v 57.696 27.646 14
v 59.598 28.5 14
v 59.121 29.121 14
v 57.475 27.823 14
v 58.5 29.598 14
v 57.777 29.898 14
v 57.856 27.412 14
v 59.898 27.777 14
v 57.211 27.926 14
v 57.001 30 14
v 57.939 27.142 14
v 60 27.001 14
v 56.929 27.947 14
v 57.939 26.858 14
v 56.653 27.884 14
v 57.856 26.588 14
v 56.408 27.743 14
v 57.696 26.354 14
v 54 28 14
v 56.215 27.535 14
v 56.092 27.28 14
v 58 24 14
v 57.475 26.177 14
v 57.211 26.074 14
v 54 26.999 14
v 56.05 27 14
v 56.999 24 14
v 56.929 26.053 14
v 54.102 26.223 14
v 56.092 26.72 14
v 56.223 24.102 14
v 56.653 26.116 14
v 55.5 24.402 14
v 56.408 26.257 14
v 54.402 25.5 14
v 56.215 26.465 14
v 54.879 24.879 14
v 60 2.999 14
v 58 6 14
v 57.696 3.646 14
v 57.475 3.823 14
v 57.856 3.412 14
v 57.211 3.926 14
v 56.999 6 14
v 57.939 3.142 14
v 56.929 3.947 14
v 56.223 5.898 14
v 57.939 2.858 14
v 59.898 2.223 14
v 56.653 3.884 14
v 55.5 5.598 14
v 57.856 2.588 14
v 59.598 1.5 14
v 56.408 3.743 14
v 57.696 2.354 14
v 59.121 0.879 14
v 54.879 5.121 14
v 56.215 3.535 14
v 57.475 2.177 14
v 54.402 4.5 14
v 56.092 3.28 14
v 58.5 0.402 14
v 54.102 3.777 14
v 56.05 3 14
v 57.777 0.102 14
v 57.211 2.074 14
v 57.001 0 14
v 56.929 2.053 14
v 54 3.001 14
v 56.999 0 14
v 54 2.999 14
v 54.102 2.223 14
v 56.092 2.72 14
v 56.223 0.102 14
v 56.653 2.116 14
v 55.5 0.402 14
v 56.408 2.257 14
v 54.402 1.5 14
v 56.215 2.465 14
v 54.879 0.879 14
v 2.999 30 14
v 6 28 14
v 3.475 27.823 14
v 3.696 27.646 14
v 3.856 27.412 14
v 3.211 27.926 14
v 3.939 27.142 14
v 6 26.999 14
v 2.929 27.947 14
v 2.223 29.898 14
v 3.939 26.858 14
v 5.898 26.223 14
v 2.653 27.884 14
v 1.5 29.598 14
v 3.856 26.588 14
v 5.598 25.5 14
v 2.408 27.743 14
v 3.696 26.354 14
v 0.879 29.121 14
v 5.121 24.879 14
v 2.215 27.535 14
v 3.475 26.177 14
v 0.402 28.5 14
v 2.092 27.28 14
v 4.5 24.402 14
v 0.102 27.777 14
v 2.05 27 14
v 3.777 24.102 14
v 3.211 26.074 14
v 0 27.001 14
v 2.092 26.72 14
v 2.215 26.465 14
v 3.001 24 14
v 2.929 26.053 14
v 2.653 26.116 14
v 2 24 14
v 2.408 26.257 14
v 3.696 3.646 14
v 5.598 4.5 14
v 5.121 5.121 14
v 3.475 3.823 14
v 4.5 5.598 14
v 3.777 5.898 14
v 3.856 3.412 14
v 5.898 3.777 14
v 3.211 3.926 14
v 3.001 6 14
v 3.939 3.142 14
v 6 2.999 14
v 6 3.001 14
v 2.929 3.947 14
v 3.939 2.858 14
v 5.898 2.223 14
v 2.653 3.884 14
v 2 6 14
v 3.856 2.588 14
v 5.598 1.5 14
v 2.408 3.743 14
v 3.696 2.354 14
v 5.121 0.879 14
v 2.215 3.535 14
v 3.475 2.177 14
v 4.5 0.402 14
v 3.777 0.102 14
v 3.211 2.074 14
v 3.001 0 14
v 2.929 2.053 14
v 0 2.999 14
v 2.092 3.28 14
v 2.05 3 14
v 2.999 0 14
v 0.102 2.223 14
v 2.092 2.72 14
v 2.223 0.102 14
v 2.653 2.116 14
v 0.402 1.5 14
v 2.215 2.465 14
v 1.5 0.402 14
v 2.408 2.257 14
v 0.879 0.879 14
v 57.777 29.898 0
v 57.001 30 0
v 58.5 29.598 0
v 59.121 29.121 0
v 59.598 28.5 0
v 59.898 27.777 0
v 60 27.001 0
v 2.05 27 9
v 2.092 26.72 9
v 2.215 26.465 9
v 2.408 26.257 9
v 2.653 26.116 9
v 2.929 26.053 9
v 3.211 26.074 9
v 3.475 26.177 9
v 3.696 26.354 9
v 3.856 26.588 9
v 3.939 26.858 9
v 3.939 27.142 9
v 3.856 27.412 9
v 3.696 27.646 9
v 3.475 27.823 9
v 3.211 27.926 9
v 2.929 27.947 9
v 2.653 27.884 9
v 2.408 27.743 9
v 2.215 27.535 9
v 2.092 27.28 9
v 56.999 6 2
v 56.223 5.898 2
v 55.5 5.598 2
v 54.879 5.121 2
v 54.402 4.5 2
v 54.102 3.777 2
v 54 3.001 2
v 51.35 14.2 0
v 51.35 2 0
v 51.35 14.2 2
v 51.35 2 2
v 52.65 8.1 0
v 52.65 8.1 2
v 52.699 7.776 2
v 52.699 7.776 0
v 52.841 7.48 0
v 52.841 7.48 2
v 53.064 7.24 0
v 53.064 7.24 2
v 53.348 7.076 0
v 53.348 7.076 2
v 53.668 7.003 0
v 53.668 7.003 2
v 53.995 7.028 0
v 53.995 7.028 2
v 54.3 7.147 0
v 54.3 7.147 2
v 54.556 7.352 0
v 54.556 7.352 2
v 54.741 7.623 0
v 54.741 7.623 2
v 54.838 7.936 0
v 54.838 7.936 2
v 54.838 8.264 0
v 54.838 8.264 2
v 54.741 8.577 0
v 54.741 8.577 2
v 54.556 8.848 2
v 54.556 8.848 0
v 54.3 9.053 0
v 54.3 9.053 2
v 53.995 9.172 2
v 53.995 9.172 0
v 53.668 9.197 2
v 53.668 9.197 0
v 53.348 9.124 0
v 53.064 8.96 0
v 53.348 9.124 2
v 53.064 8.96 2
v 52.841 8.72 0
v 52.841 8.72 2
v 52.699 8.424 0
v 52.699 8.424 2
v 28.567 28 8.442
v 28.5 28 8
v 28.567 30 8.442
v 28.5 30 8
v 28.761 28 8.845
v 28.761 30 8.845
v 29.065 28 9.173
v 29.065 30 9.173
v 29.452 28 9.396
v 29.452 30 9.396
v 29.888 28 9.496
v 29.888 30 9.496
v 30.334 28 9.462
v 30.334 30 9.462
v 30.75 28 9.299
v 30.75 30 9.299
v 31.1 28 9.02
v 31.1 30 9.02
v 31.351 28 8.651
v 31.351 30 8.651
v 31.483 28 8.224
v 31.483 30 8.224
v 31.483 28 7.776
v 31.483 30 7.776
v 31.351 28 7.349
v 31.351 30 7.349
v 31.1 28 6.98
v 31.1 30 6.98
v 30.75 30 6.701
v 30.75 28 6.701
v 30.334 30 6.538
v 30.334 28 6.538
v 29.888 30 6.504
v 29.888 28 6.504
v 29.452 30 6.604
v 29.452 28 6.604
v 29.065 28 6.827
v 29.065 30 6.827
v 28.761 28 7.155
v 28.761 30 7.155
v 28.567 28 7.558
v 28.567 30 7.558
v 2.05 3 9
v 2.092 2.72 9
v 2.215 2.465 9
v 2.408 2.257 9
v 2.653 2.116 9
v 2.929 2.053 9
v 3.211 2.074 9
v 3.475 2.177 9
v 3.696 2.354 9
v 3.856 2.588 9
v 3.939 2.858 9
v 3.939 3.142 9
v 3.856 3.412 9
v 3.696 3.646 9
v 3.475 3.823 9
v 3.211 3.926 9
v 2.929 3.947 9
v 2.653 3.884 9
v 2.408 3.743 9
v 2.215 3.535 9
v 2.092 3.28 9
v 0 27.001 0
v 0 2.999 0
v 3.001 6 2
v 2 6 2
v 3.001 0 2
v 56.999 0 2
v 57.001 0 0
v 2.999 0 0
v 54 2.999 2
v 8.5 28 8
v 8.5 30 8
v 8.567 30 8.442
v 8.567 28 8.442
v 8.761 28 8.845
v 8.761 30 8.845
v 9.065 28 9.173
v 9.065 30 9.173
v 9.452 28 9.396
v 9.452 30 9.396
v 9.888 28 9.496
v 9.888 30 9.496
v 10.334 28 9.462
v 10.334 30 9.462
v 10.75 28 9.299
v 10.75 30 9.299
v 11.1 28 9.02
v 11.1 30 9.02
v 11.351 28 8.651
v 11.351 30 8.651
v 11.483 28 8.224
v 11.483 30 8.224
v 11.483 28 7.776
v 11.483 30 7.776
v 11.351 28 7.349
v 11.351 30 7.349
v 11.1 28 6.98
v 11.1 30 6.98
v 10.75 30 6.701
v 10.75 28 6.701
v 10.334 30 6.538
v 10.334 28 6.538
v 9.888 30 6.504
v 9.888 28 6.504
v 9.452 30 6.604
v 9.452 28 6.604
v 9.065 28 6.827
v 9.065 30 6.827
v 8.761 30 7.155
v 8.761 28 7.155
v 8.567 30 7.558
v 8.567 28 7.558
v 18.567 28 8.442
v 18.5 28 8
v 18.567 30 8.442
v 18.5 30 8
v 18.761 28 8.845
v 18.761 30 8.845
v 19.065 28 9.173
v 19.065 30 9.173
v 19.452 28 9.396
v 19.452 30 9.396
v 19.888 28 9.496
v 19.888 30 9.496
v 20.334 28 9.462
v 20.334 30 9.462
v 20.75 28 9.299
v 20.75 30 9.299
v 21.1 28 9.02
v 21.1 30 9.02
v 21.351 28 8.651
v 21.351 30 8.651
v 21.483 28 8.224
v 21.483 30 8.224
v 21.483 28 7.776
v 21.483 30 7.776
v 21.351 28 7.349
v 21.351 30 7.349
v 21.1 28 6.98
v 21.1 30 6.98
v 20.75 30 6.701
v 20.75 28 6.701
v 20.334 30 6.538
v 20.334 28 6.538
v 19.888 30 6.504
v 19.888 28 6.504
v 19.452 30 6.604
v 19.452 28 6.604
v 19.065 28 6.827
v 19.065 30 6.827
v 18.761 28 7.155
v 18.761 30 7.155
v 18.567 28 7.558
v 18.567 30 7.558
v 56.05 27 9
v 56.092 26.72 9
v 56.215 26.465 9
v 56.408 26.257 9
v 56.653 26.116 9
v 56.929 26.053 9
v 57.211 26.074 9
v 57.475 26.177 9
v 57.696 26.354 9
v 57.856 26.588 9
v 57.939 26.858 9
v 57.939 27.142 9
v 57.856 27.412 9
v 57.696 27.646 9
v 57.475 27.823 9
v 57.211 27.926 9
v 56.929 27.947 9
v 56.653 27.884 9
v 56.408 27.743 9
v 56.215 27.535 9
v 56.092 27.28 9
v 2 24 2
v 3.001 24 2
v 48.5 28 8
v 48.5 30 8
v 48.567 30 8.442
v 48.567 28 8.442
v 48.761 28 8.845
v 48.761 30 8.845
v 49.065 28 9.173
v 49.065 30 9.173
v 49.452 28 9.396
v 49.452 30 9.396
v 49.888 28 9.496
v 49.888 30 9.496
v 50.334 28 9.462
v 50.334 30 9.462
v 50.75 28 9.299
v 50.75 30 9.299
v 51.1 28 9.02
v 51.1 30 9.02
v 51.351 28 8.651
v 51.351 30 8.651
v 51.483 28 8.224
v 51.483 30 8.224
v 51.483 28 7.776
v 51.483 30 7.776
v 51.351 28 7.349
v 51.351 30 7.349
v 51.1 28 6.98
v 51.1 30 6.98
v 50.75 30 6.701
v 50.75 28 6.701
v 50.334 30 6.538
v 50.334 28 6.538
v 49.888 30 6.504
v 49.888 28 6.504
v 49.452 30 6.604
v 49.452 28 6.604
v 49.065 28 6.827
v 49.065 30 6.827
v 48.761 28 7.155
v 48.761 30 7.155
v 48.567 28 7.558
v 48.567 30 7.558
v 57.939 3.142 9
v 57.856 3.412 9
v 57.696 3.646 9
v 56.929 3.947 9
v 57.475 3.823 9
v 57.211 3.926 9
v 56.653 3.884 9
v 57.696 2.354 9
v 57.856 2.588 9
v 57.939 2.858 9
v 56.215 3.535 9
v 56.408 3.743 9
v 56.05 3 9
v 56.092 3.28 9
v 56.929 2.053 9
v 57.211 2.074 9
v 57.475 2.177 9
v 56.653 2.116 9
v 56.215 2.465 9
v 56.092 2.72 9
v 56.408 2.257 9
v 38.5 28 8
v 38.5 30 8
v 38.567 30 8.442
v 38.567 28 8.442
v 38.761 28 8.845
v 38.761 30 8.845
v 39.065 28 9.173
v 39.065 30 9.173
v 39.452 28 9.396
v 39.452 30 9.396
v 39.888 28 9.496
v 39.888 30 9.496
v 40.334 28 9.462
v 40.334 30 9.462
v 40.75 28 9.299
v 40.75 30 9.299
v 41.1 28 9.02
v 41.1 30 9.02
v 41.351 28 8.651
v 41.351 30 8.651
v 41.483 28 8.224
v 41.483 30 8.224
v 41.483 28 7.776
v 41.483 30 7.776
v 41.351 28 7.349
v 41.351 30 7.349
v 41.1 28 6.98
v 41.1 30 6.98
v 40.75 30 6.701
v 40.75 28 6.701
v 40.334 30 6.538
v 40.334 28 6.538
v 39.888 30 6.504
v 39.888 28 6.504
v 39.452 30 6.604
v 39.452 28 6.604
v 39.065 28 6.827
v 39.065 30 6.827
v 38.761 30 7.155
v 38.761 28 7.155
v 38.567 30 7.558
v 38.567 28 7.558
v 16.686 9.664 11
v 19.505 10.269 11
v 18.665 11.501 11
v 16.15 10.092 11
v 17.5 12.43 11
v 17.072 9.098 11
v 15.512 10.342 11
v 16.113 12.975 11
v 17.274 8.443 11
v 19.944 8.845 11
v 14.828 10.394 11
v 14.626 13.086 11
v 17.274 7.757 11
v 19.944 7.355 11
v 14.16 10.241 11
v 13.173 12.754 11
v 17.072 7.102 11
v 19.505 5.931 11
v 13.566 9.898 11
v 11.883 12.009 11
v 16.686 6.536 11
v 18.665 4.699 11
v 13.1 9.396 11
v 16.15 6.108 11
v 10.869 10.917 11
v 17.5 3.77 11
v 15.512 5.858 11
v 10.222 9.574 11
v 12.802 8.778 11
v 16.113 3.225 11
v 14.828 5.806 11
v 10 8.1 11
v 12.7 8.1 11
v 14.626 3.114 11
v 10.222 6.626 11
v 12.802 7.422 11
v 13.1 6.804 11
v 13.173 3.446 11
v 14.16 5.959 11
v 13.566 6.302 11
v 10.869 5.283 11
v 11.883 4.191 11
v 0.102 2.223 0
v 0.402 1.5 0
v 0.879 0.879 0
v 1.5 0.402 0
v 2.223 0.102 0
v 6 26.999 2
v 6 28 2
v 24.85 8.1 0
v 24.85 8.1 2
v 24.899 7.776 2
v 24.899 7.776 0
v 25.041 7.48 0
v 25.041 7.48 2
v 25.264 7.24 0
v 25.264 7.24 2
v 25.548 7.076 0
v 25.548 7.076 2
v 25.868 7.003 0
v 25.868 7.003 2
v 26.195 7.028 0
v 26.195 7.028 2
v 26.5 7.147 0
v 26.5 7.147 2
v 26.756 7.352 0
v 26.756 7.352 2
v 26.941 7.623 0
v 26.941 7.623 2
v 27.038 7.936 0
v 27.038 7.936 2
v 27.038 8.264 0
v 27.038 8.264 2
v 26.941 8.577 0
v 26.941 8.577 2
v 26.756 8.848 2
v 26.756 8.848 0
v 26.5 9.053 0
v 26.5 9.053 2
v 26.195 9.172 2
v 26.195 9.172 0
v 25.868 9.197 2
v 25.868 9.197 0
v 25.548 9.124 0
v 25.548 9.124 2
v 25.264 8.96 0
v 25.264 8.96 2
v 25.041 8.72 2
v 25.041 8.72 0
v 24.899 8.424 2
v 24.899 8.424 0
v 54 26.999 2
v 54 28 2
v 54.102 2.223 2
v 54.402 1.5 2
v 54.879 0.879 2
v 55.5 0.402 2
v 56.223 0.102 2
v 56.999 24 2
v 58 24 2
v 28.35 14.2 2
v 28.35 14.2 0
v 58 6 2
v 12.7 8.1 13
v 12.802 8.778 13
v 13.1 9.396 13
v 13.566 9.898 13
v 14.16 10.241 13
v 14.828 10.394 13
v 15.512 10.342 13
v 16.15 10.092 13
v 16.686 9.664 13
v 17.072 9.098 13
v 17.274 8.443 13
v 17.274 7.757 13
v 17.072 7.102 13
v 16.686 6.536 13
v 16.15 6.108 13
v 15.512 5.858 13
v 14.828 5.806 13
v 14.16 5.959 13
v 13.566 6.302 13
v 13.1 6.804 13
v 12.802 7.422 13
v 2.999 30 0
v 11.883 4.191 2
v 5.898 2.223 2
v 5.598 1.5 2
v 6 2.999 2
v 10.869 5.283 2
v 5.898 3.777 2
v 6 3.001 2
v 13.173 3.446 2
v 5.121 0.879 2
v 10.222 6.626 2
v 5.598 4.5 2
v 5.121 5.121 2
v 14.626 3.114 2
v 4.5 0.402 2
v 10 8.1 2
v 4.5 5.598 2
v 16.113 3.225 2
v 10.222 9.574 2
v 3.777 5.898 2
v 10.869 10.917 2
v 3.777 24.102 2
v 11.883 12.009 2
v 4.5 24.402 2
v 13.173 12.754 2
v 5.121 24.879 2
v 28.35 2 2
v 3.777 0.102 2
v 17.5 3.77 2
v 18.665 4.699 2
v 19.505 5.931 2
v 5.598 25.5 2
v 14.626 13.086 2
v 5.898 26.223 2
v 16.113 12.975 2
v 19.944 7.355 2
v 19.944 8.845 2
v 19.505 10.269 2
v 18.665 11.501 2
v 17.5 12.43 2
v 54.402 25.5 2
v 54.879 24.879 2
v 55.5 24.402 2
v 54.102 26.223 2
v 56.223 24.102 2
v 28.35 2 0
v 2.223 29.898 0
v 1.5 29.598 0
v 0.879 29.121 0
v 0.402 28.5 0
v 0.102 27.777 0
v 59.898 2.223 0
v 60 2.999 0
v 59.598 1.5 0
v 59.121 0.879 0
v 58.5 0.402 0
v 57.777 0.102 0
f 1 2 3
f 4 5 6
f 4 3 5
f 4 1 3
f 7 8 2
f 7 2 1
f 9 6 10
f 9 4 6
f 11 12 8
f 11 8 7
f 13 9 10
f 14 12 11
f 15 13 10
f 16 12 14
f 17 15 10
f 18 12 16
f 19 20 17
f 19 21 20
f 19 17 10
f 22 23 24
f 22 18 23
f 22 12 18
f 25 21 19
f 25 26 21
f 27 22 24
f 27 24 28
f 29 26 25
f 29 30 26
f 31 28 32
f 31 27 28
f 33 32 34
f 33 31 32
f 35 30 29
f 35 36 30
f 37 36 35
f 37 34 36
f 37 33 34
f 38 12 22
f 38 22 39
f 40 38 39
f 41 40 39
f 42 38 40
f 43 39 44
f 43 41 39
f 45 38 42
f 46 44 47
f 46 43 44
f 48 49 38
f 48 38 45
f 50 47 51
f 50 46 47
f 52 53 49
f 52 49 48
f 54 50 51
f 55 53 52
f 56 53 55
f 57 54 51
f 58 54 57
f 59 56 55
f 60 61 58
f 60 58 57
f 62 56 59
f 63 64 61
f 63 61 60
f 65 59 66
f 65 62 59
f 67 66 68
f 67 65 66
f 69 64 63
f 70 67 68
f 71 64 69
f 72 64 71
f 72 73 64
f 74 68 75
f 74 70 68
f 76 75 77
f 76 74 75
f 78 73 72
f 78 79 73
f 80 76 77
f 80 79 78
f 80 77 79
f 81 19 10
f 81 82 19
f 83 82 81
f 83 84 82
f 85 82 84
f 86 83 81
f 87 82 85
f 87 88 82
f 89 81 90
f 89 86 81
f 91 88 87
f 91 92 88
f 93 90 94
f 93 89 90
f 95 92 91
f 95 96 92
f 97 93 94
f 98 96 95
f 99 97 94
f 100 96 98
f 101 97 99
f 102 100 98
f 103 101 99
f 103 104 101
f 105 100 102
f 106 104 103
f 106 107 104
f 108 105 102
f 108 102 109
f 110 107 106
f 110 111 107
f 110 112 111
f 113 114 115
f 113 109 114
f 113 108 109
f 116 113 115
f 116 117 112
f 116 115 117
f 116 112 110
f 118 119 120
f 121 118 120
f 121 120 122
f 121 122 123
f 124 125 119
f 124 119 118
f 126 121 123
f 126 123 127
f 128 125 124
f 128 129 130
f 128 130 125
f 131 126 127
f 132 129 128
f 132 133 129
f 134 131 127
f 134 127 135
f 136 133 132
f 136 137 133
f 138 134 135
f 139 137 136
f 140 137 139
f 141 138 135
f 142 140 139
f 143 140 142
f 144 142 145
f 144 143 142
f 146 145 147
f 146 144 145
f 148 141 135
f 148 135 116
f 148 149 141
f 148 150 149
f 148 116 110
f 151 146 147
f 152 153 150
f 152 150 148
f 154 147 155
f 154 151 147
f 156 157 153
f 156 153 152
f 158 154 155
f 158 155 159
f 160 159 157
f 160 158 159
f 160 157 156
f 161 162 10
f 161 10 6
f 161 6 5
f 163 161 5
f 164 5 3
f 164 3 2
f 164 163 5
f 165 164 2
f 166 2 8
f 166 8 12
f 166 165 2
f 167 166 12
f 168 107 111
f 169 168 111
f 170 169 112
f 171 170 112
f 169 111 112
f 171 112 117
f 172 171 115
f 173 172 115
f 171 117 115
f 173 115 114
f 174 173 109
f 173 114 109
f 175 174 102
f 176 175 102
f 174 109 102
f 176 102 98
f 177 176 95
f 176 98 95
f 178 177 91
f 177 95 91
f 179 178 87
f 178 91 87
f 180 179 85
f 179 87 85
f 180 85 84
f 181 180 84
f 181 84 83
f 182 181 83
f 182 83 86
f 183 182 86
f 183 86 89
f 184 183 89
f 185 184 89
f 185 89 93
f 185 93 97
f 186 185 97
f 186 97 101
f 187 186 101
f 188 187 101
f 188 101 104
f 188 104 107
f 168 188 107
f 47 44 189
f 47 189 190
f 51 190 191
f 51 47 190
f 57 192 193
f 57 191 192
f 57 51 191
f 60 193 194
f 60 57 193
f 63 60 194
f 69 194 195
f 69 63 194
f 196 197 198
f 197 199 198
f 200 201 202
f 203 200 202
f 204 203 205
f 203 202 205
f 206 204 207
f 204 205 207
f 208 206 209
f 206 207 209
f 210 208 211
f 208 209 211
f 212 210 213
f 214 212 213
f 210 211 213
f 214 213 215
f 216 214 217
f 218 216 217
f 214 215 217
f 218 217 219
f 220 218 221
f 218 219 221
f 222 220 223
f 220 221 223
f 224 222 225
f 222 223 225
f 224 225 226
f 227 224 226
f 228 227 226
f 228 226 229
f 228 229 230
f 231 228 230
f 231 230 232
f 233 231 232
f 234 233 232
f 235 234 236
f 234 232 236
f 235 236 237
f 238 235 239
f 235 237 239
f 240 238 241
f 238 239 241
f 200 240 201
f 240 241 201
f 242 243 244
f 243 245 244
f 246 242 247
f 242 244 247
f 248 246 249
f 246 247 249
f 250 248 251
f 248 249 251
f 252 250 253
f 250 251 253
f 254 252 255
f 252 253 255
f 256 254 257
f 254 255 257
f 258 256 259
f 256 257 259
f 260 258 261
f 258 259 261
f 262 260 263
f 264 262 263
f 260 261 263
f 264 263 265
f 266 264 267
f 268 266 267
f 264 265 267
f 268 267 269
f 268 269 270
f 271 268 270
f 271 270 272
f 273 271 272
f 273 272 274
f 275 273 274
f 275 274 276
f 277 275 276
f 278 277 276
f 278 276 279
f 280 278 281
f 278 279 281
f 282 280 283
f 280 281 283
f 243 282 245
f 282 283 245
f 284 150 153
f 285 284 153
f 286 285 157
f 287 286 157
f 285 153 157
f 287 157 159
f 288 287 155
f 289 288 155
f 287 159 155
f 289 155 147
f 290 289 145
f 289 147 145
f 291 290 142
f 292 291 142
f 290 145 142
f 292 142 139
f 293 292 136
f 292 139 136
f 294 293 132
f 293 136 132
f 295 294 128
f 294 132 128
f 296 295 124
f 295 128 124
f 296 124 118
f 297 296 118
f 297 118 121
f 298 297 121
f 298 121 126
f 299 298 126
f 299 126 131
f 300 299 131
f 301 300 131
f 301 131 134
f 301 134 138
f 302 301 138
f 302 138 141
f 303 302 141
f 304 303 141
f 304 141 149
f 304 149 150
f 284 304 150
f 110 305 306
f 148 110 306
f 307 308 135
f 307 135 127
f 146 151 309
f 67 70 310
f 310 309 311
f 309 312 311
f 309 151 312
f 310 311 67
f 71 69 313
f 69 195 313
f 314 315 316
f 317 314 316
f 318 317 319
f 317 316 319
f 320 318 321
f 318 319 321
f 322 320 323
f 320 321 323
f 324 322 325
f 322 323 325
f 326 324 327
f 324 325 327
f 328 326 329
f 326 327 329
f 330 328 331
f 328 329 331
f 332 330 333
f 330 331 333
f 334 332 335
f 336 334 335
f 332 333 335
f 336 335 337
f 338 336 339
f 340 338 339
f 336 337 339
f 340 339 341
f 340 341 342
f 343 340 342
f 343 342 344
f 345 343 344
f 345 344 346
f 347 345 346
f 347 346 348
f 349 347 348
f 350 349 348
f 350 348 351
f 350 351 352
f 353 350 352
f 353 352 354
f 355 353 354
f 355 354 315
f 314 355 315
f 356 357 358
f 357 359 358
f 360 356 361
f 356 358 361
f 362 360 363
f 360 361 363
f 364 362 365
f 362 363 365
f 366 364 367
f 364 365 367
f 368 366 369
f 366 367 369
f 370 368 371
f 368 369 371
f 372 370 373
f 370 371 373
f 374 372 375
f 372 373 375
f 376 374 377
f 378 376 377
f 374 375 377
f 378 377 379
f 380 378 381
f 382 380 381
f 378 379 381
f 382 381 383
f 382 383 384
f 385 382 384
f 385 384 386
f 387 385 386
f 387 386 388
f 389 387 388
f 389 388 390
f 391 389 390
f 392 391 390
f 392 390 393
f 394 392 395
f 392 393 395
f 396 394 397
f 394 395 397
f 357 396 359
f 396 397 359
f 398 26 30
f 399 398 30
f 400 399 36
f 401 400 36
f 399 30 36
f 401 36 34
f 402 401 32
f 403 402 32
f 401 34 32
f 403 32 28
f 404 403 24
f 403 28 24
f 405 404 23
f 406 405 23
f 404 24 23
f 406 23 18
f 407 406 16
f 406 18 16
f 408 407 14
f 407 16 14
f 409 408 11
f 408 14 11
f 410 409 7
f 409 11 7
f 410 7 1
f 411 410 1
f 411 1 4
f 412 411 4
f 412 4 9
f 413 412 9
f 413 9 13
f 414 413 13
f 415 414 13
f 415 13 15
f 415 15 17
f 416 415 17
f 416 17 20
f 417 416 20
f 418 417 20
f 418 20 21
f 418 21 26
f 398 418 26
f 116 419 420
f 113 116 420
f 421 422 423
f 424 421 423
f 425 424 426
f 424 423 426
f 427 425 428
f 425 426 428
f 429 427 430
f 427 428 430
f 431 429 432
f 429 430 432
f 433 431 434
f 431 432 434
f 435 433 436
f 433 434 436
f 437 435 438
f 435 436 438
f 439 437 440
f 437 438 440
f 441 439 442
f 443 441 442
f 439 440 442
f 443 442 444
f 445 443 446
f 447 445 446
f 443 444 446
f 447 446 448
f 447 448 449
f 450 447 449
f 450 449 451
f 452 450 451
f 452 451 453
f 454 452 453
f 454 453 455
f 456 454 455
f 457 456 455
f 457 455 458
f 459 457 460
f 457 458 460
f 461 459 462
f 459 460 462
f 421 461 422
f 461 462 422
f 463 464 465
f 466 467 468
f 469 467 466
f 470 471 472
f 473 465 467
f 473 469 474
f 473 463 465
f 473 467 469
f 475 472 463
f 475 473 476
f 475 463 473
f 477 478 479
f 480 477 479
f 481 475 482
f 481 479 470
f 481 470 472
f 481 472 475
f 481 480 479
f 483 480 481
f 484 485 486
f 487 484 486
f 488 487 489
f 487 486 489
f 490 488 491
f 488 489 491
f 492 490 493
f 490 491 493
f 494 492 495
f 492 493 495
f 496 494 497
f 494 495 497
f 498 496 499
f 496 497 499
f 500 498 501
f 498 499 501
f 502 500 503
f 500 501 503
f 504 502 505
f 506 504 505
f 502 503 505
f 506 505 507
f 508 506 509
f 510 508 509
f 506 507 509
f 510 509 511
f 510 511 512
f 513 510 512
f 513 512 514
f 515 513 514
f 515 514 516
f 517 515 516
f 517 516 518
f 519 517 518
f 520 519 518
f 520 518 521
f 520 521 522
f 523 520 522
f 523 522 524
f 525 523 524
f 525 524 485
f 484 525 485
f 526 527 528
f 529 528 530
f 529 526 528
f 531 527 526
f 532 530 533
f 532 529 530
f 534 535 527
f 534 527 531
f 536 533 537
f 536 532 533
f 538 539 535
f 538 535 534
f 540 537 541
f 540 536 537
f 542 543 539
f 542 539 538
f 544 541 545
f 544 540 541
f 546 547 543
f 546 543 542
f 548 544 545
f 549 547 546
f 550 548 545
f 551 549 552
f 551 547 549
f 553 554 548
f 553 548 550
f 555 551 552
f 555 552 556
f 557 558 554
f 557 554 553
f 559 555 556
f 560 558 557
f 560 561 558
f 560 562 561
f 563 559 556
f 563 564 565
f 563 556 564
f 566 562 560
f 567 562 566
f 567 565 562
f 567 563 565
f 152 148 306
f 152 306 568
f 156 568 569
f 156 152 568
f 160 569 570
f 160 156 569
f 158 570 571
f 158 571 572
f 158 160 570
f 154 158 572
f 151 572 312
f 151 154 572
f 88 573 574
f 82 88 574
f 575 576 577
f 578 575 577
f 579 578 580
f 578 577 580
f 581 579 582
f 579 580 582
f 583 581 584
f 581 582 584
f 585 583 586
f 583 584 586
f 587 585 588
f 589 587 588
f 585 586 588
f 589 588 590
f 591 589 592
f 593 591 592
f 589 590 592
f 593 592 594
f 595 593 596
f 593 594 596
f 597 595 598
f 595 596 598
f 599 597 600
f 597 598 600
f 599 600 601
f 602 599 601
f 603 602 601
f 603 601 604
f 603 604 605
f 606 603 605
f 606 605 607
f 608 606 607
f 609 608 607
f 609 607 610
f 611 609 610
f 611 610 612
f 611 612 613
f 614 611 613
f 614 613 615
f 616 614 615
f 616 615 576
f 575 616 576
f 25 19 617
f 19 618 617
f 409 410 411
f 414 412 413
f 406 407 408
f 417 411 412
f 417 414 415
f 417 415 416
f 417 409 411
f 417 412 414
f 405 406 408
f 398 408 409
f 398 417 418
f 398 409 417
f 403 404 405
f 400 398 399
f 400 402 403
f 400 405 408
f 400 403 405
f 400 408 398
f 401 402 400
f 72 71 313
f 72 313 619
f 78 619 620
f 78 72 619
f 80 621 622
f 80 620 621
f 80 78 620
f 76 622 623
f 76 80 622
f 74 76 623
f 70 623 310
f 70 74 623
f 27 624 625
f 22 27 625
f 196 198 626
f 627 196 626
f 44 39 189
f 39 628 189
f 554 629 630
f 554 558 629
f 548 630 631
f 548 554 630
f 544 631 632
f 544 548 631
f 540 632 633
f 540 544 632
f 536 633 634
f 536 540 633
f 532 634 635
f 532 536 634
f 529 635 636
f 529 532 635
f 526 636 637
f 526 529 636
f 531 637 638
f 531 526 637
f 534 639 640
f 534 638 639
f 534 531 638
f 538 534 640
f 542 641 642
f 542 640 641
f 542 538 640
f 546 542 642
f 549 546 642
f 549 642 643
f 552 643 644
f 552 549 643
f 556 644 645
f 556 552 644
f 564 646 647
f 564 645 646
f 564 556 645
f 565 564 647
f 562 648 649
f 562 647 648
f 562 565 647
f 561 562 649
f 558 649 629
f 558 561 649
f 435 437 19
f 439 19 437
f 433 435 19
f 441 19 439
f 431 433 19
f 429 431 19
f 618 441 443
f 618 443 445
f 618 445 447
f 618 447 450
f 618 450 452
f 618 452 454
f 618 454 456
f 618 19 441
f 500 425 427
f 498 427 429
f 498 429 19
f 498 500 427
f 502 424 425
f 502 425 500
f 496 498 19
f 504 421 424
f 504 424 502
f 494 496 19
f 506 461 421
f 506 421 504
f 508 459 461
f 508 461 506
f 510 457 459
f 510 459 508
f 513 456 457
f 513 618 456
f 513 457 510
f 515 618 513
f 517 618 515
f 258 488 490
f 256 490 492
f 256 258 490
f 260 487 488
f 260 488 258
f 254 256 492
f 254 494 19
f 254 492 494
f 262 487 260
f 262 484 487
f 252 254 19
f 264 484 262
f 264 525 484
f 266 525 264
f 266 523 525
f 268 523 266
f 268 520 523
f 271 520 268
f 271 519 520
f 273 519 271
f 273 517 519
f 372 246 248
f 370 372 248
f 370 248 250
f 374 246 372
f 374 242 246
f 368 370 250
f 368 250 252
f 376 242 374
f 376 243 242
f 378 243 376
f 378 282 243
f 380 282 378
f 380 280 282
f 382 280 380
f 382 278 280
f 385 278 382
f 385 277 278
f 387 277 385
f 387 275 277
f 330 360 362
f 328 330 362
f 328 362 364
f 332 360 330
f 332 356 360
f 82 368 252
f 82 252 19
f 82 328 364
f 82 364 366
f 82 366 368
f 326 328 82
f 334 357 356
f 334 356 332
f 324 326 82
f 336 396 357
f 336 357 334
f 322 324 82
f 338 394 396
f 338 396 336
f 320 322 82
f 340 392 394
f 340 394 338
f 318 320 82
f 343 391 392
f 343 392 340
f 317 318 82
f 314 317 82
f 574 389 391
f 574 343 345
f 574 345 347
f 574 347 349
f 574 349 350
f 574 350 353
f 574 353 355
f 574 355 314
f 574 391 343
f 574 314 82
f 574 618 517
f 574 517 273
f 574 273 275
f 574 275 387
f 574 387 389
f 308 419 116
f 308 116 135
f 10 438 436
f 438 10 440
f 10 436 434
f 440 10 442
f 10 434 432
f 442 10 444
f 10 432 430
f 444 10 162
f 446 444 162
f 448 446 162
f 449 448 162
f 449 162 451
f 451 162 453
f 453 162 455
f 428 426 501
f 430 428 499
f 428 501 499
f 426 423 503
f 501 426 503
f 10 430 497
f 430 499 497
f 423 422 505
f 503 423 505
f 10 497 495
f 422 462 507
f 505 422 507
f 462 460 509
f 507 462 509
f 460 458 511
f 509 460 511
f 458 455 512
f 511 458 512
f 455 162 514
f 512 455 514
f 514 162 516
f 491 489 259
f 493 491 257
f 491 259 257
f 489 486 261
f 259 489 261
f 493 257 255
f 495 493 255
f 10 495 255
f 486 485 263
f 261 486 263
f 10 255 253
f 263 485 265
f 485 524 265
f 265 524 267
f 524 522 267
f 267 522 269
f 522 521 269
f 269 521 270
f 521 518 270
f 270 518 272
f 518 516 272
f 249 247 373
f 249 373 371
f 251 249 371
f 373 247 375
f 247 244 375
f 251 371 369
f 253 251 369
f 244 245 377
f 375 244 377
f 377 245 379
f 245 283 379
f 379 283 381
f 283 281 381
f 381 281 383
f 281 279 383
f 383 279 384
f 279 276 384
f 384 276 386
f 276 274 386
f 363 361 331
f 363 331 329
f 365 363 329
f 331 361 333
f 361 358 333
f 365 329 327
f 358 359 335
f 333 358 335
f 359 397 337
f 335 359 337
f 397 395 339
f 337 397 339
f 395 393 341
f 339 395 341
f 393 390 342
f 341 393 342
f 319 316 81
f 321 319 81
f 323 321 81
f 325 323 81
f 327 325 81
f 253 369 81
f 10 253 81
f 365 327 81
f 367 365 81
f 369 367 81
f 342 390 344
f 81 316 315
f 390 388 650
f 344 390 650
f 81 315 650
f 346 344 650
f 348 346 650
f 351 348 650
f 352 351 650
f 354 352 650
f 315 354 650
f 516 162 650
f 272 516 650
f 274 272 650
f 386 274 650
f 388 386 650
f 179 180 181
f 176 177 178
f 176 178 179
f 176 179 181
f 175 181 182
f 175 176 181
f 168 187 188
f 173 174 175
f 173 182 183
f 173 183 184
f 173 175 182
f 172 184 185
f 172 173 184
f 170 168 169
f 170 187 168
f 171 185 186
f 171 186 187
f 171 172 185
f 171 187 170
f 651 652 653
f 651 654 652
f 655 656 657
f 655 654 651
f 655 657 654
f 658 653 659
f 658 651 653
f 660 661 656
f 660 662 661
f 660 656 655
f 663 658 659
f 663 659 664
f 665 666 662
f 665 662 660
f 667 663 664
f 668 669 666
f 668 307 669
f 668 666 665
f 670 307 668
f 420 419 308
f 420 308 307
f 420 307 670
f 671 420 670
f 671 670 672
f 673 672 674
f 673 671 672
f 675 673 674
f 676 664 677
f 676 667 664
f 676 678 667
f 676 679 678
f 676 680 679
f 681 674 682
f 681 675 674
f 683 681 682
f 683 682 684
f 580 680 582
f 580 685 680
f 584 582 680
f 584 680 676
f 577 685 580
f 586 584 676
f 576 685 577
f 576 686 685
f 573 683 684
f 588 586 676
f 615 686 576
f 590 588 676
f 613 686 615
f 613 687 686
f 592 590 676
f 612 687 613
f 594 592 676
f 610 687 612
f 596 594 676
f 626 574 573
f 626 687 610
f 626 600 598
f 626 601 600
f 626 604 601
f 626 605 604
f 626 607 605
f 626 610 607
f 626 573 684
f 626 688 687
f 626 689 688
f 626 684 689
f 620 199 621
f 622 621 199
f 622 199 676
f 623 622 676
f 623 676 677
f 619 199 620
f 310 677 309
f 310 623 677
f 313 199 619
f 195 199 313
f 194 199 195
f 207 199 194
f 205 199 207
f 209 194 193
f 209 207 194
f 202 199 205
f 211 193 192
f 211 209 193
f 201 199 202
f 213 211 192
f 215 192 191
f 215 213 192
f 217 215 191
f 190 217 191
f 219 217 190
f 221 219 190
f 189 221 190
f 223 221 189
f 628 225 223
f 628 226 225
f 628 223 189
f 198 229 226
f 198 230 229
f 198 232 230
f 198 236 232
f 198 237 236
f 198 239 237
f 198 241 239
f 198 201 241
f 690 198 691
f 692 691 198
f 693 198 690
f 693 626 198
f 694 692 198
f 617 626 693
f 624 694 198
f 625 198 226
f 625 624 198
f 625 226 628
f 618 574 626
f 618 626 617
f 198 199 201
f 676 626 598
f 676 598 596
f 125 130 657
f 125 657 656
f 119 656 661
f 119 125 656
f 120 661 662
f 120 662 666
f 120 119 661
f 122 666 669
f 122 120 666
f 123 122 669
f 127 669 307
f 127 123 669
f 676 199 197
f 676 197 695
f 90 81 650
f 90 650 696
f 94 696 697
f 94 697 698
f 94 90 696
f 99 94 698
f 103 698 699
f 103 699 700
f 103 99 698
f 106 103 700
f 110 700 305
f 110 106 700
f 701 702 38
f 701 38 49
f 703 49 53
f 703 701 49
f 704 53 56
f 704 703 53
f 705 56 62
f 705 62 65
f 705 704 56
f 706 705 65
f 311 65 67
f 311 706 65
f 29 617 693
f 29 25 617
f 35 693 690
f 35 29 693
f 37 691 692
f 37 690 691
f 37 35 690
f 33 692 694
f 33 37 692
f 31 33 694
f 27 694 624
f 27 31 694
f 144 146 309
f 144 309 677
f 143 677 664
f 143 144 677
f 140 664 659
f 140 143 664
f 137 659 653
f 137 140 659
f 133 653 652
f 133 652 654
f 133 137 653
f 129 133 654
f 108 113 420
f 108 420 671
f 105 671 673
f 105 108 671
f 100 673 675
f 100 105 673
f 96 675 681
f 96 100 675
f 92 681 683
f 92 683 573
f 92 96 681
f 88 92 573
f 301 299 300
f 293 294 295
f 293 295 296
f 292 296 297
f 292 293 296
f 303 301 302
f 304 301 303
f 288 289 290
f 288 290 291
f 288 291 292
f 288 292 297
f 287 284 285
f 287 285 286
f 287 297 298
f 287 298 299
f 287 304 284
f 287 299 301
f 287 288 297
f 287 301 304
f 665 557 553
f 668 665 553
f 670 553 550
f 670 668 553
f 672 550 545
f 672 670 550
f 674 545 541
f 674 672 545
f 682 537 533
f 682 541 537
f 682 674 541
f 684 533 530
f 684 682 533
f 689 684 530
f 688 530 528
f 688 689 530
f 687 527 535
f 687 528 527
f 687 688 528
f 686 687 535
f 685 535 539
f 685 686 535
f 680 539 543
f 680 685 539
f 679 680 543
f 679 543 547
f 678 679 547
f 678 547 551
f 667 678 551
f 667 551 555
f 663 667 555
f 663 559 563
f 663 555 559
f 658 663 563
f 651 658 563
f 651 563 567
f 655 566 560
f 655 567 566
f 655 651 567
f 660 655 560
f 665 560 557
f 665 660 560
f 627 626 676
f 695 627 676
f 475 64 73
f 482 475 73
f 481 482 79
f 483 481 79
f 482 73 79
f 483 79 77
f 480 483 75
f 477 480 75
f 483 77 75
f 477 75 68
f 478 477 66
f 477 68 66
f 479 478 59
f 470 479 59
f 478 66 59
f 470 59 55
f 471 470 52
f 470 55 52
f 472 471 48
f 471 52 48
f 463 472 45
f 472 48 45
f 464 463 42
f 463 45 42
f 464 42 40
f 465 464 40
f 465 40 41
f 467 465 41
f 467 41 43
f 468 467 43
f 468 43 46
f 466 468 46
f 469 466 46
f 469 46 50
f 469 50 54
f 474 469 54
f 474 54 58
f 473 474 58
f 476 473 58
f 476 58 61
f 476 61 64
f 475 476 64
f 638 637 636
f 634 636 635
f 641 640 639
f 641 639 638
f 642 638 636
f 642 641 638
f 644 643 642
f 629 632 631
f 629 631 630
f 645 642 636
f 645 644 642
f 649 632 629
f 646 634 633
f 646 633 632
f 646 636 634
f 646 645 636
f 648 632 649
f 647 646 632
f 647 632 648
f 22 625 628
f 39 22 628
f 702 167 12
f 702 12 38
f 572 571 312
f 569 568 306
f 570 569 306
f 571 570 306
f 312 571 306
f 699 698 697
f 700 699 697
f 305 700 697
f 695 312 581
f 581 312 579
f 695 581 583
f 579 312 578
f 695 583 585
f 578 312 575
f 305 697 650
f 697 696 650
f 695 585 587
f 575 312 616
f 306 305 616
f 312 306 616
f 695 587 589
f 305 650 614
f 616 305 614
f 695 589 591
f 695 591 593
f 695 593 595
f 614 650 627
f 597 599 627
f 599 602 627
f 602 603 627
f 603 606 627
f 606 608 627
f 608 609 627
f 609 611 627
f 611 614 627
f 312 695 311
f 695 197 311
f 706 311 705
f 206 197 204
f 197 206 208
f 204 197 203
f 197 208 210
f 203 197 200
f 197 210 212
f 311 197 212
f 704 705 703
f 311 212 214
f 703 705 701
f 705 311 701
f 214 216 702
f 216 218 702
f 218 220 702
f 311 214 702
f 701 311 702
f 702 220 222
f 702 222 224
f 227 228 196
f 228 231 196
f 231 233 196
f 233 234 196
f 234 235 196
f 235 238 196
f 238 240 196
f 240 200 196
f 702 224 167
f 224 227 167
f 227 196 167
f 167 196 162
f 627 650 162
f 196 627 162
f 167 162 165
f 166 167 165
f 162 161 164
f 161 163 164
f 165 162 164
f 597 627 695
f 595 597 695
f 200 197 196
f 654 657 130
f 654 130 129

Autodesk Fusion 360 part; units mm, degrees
sketch "스케치1" plane through (0, 0, 0) normal (0, 0, 1) x (1, 0, 0)
  line L0 (0, 0) -> (60, 0)
  line L1 (60, 0) -> (60, 30)
  line L2 (60, 30) -> (0, 30)
  line L3 (0, 30) -> (0, 0)
  dimension "d1" = 60
  dimension "d2" = 30
extrude "돌출1" add sketch "스케치1" along normal blind 2
sketch "스케치2" plane through (0, 0, 2) normal (0, 0, 1) x (-1, 0, 0)
  circle A0 centre (-53.75, -8.1) radius 1.1
  circle A1 centre (-25.95, -8.1) radius 1.1
  circle A2 centre (-15, -8.1) radius 5
  line L0 (0, 0) -> (-60, 0)
  line L1 (-51.35, -2) -> (-51.35, -14.2)
  line L2 (-51.35, -14.2) -> (-28.35, -14.2)
  line L3 (-28.35, -14.2) -> (-28.35, -2)
  line L4 (-51.35, -2) -> (-28.35, -2)
  dimension "d5" = 2.2
  dimension "d6" = 27.8
  dimension "d8" = 8.1
  dimension "d9" = 10
  dimension "d11" = 15
  dimension "d28" = 25.95
  dimension "d91" = 23
  dimension "d93" = 2.4
  dimension "d94" = 2
  dimension "d95" = 12.2
extrude "돌출2" cut sketch "스케치2" against normal blind 2 contours A0 | A1 | L1 L2 L3 L4
extrude "돌출3" add sketch "스케치2" along normal blind 9 contours A2
sketch "스케치4" plane through (0, 0, 11) normal (0, 0, 1) x (-1, 0, 0)
  circle A0 centre (-15, -8.1) radius 2.3
  circle A1 centre (-15, -8.1) radius 5
  dimension "d34" = 4.6
extrude "돌출5" add sketch "스케치4" along normal blind 2 contours A0
sketch "스케치5" plane through (0, 0, 2) normal (0, 0, 1) x (-1, 0, 0)
  line L0 (0, -30) -> (0, 0)
  line L1 (0, 0) -> (0, -30)
  line L2 (-60, -30) -> (0, -30)
  line L3 (-60, -30) -> (-60, 0)
  line L4 (0, 0) -> (-60, 0)
  line L5 (-60, 0) -> (-54, 0)
  line L6 (-54, -28) -> (-6, -28)
  line L7 (-2, -24) -> (-2, -6)
  line L8 (-6, 0) -> (0, 0)
  line L9 (-58, -24) -> (-58, -6)
  line L10 (-2, -24) -> (-6, -24)
  line L11 (-6, -24) -> (-6, -28)
  line L12 (-54, -28) -> (-54, -24)
  line L13 (-54, -24) -> (-58, -24)
  line L14 (-2, -6) -> (-6, -6)
  line L15 (0, 0) -> (-60, 0)
  line L16 (-6, -6) -> (-6, 0)
  line L17 (-58, -6) -> (-54, -6)
  line L18 (-54, -6) -> (-54, 0)
  point P0 (0, -30)
  point P1 (-60, -30)
  point P2 (-60, 0)
  dimension "d38" = 2
  dimension "d39" = 2
  dimension "d42" = 2
  dimension "d43" = 6
  dimension "d44" = 6
  dimension "d45" = 6
  dimension "d46" = 6
  dimension "d47" = 6
extrude "돌출6" add sketch "스케치5" along normal blind 12 contours L0 L1 L2 L3 L4 L5 L6 L7 L8 L9 L10 L11 L12 L13 L14 L15 L16 L17 L18
sketch "스케치6" plane through (0, 0, 14) normal (0, 0, 1) x (-1, 0, 0)
  circle A0 centre (-3, -27) radius 0.95
  circle A1 centre (-3, -3) radius 0.95
  circle A2 centre (-57, -27) radius 0.95
  circle A3 centre (-57, -3) radius 0.95
  dimension "d48" = 1.9
  dimension "d49" = 3
  dimension "d51" = 3
  dimension "d52" = 24
  dimension "d53" = 54
extrude "돌출7" cut sketch "스케치6" against normal blind 5
fillet "필렛1" radius 3 8 edges at (60, 0, 7) (0, 0, 7) (60, 30, 7) (0, 30, 7) (54, 24, 8) (6, 24, 8) (54, 6, 8) (6, 6, 8)
fillet "필렛1" radius 3 2 edges at (54, 0, 8) (6, 0, 8)
sketch "스케치9" plane through (0, 30, 0) normal (0, 1, 0) x (-1, 0, 0)
  circle A0 centre (-50, 8) radius 1.5
  circle A1 centre (-30, 8) radius 1.5
  circle A2 centre (-10, 8) radius 1.5
  circle A3 centre (-40, 8) radius 1.5
  circle A4 centre (-20, 8) radius 1.5
  dimension "d74" = 3
  dimension "d75" = 8
  dimension "d80" = 10
  dimension "d81" = 10
  dimension "d82" = 10
  dimension "d83" = 10
  dimension "d84" = 10
extrude "돌출10" cut sketch "스케치9" against normal blind 2
